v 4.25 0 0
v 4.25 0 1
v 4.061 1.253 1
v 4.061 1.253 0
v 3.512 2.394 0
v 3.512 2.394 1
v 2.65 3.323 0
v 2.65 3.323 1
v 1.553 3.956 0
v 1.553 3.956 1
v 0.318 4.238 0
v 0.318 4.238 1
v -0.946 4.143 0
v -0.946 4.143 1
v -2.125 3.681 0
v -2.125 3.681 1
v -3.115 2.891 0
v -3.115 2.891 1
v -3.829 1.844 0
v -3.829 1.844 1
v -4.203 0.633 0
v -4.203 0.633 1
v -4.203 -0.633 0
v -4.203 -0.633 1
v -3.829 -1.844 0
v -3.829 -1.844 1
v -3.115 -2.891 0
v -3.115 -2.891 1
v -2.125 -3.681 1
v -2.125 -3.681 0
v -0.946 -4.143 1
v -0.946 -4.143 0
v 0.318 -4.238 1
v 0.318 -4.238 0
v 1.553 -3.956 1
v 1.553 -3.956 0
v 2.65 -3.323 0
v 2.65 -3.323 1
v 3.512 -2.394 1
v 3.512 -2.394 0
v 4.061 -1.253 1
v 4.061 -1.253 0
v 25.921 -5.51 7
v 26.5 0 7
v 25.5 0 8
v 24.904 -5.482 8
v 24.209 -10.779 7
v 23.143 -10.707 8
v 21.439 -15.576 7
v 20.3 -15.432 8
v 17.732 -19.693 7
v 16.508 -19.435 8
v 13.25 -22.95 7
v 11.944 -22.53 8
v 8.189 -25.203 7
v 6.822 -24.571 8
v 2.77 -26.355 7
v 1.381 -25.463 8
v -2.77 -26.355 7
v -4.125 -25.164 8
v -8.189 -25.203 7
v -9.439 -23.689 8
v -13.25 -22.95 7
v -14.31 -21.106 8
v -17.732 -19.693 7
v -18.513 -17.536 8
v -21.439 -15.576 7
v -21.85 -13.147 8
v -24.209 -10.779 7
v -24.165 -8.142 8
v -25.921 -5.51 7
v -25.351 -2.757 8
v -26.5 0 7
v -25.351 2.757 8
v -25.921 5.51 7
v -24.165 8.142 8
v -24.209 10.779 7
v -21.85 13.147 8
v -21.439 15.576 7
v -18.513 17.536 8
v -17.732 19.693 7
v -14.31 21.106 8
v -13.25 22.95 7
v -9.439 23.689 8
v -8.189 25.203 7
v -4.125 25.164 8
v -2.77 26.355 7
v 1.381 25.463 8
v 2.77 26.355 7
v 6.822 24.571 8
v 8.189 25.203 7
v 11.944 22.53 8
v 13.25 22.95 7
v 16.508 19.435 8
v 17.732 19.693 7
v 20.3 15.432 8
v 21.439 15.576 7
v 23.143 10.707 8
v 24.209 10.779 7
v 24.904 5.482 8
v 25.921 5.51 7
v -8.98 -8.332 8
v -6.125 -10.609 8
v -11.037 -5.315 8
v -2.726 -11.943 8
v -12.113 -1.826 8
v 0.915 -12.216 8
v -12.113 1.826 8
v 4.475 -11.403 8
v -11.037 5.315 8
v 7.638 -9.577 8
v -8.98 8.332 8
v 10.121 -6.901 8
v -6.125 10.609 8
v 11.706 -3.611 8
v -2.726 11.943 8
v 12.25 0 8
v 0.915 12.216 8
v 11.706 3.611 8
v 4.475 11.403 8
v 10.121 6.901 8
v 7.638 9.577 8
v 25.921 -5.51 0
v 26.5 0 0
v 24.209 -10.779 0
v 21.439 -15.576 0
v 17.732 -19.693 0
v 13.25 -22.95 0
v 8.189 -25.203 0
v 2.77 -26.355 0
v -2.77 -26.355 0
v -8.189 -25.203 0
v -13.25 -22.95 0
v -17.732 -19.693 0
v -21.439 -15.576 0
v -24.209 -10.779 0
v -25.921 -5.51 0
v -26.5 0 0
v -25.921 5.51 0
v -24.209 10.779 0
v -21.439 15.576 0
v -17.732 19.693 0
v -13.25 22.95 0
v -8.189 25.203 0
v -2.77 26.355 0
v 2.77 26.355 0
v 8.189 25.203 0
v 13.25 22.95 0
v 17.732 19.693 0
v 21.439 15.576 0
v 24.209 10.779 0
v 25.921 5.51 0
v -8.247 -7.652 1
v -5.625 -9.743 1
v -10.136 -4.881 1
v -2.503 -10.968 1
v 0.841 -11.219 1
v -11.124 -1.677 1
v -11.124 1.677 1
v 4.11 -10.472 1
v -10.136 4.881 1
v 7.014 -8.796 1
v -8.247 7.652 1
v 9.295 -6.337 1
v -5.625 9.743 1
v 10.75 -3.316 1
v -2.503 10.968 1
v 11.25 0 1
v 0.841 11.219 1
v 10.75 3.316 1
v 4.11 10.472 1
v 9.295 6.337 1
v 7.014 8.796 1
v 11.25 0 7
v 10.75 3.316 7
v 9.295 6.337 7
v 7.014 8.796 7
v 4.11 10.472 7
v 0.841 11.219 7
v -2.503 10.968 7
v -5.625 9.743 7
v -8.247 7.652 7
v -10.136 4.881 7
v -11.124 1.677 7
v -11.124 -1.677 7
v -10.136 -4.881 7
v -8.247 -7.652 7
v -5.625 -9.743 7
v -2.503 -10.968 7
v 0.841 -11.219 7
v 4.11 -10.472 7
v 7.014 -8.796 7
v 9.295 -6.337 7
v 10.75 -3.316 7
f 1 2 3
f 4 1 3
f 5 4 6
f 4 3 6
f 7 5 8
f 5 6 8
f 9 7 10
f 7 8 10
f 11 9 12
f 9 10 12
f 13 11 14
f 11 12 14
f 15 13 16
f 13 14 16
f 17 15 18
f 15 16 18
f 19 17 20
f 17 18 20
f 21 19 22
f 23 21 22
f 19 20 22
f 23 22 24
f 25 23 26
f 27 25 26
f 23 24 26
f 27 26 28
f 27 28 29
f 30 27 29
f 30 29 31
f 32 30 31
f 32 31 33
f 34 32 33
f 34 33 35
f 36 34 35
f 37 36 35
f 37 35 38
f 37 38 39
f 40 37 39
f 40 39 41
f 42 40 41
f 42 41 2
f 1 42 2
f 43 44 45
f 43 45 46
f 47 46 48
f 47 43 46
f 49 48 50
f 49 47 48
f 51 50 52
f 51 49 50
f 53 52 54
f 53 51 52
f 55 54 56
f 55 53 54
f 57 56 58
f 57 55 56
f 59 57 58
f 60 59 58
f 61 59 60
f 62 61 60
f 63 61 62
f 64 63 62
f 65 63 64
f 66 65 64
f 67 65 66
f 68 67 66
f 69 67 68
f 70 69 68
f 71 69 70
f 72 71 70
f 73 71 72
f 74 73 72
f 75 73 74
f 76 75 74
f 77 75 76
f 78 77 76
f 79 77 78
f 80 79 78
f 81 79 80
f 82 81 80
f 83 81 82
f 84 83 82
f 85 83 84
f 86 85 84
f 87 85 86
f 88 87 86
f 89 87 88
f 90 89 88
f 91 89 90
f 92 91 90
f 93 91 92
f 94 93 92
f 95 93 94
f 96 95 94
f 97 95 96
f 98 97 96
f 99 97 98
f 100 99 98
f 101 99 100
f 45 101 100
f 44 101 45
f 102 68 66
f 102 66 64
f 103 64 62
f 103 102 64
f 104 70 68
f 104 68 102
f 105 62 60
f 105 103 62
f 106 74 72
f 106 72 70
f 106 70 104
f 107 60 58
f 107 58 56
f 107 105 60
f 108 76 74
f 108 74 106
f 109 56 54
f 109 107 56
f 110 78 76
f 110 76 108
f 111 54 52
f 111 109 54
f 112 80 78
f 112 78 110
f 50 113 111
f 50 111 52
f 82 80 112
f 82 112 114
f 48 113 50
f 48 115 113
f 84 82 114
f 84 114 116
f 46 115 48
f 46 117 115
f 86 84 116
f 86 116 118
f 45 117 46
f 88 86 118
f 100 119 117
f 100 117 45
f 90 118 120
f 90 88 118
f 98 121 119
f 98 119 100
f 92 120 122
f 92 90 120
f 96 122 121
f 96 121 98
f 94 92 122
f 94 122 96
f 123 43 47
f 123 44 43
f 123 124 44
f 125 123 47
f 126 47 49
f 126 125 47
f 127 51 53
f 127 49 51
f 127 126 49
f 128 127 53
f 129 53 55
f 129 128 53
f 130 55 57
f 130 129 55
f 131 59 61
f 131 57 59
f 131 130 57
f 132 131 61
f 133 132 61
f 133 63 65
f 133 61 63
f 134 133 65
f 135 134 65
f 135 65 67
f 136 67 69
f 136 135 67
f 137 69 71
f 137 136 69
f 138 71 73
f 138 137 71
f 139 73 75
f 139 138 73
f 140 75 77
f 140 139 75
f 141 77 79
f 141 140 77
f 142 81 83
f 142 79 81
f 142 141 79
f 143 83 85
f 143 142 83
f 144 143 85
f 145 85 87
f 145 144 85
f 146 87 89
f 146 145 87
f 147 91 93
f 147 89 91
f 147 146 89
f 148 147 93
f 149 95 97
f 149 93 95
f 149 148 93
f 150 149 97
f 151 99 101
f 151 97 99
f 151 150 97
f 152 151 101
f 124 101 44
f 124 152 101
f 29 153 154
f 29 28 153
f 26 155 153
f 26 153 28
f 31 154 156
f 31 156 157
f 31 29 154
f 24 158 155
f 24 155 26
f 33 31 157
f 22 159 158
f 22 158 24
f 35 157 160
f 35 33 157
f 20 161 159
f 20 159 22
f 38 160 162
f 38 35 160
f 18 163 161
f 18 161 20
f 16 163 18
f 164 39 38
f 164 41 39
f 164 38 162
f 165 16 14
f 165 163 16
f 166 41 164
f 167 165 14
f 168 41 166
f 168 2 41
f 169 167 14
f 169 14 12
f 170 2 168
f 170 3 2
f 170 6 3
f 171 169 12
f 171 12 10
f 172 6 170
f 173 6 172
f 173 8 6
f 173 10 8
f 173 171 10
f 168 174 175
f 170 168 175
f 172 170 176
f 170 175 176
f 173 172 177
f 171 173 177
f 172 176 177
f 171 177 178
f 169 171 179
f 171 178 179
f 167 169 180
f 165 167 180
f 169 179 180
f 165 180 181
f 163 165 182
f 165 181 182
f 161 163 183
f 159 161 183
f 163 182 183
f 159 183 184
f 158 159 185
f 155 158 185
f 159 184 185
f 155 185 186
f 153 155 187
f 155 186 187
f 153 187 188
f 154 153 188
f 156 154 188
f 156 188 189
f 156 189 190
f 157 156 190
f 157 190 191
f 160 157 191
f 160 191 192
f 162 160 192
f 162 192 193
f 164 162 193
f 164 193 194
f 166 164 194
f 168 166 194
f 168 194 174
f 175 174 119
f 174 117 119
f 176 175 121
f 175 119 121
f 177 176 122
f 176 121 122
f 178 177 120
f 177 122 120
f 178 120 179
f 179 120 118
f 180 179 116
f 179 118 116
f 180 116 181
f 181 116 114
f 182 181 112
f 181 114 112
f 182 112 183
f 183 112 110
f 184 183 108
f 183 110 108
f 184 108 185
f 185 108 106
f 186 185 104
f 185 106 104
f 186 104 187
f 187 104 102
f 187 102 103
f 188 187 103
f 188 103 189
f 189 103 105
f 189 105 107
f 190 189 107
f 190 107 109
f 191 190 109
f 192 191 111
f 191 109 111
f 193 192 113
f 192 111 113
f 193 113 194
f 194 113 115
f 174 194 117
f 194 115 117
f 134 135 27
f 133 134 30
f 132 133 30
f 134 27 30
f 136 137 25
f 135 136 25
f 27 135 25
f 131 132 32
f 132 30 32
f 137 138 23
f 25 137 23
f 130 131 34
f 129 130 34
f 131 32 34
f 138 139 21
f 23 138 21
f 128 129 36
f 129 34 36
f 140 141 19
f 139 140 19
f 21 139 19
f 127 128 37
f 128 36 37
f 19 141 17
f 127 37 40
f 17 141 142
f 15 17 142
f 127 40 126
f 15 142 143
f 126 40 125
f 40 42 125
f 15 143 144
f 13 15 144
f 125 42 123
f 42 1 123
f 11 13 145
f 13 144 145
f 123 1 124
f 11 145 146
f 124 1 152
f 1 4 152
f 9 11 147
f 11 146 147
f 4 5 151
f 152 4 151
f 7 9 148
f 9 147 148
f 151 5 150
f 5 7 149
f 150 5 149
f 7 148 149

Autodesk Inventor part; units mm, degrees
ref_plane "YZ Plane" through (0, 0, 0) normal (1, 0, 0) x (0, 1, 0)
ref_plane "XZ Plane" through (0, 0, 0) normal (0, 1, 0) x (-1, 0, 0)
ref_plane "XY Plane" through (0, 0, 0) normal (0, 0, 1) x (1, 0, 0)
sketch "Sketch1" plane through (0, 0, 0) normal (0, 0, 1) x (1, 0, 0)
  circle A0 centre (0, 0) radius 26.5
  dimension "d0" = 53
extrude "Extrusion1" add sketch "Sketch1" along normal blind 8
sketch "Sketch2" plane through (0, 0, 8) normal (0, 0, 1) x (1, 0, 0)
  circle A0 centre (0, 0) radius 26.5 projected
  circle A1 centre (0, 0) radius 4.25
  dimension "d3" = 8.5
extrude "Extrusion2" cut sketch "Sketch2" against normal blind 8 contours A1
sketch "Sketch3" plane through (0, 0, 8) normal (0, 0, 1) x (1, 0, 0)
  circle A0 centre (0, 0) radius 4.25 projected
  circle A1 centre (0, 0) radius 26.5 projected
  circle A2 centre (0, 0) radius 11.25
  dimension "d6" = 22.5
extrude "Extrusion3" cut sketch "Sketch3" against normal blind 7 contours A2
chamfer "Chamfer1" distance 1 angle 45 1 edges at (-11.25, 0, 8)
chamfer "Chamfer2" distance 1 angle 45 1 edges at (-26.5, 0, 8)
properties part number "SpoolHandle-wheel1"
